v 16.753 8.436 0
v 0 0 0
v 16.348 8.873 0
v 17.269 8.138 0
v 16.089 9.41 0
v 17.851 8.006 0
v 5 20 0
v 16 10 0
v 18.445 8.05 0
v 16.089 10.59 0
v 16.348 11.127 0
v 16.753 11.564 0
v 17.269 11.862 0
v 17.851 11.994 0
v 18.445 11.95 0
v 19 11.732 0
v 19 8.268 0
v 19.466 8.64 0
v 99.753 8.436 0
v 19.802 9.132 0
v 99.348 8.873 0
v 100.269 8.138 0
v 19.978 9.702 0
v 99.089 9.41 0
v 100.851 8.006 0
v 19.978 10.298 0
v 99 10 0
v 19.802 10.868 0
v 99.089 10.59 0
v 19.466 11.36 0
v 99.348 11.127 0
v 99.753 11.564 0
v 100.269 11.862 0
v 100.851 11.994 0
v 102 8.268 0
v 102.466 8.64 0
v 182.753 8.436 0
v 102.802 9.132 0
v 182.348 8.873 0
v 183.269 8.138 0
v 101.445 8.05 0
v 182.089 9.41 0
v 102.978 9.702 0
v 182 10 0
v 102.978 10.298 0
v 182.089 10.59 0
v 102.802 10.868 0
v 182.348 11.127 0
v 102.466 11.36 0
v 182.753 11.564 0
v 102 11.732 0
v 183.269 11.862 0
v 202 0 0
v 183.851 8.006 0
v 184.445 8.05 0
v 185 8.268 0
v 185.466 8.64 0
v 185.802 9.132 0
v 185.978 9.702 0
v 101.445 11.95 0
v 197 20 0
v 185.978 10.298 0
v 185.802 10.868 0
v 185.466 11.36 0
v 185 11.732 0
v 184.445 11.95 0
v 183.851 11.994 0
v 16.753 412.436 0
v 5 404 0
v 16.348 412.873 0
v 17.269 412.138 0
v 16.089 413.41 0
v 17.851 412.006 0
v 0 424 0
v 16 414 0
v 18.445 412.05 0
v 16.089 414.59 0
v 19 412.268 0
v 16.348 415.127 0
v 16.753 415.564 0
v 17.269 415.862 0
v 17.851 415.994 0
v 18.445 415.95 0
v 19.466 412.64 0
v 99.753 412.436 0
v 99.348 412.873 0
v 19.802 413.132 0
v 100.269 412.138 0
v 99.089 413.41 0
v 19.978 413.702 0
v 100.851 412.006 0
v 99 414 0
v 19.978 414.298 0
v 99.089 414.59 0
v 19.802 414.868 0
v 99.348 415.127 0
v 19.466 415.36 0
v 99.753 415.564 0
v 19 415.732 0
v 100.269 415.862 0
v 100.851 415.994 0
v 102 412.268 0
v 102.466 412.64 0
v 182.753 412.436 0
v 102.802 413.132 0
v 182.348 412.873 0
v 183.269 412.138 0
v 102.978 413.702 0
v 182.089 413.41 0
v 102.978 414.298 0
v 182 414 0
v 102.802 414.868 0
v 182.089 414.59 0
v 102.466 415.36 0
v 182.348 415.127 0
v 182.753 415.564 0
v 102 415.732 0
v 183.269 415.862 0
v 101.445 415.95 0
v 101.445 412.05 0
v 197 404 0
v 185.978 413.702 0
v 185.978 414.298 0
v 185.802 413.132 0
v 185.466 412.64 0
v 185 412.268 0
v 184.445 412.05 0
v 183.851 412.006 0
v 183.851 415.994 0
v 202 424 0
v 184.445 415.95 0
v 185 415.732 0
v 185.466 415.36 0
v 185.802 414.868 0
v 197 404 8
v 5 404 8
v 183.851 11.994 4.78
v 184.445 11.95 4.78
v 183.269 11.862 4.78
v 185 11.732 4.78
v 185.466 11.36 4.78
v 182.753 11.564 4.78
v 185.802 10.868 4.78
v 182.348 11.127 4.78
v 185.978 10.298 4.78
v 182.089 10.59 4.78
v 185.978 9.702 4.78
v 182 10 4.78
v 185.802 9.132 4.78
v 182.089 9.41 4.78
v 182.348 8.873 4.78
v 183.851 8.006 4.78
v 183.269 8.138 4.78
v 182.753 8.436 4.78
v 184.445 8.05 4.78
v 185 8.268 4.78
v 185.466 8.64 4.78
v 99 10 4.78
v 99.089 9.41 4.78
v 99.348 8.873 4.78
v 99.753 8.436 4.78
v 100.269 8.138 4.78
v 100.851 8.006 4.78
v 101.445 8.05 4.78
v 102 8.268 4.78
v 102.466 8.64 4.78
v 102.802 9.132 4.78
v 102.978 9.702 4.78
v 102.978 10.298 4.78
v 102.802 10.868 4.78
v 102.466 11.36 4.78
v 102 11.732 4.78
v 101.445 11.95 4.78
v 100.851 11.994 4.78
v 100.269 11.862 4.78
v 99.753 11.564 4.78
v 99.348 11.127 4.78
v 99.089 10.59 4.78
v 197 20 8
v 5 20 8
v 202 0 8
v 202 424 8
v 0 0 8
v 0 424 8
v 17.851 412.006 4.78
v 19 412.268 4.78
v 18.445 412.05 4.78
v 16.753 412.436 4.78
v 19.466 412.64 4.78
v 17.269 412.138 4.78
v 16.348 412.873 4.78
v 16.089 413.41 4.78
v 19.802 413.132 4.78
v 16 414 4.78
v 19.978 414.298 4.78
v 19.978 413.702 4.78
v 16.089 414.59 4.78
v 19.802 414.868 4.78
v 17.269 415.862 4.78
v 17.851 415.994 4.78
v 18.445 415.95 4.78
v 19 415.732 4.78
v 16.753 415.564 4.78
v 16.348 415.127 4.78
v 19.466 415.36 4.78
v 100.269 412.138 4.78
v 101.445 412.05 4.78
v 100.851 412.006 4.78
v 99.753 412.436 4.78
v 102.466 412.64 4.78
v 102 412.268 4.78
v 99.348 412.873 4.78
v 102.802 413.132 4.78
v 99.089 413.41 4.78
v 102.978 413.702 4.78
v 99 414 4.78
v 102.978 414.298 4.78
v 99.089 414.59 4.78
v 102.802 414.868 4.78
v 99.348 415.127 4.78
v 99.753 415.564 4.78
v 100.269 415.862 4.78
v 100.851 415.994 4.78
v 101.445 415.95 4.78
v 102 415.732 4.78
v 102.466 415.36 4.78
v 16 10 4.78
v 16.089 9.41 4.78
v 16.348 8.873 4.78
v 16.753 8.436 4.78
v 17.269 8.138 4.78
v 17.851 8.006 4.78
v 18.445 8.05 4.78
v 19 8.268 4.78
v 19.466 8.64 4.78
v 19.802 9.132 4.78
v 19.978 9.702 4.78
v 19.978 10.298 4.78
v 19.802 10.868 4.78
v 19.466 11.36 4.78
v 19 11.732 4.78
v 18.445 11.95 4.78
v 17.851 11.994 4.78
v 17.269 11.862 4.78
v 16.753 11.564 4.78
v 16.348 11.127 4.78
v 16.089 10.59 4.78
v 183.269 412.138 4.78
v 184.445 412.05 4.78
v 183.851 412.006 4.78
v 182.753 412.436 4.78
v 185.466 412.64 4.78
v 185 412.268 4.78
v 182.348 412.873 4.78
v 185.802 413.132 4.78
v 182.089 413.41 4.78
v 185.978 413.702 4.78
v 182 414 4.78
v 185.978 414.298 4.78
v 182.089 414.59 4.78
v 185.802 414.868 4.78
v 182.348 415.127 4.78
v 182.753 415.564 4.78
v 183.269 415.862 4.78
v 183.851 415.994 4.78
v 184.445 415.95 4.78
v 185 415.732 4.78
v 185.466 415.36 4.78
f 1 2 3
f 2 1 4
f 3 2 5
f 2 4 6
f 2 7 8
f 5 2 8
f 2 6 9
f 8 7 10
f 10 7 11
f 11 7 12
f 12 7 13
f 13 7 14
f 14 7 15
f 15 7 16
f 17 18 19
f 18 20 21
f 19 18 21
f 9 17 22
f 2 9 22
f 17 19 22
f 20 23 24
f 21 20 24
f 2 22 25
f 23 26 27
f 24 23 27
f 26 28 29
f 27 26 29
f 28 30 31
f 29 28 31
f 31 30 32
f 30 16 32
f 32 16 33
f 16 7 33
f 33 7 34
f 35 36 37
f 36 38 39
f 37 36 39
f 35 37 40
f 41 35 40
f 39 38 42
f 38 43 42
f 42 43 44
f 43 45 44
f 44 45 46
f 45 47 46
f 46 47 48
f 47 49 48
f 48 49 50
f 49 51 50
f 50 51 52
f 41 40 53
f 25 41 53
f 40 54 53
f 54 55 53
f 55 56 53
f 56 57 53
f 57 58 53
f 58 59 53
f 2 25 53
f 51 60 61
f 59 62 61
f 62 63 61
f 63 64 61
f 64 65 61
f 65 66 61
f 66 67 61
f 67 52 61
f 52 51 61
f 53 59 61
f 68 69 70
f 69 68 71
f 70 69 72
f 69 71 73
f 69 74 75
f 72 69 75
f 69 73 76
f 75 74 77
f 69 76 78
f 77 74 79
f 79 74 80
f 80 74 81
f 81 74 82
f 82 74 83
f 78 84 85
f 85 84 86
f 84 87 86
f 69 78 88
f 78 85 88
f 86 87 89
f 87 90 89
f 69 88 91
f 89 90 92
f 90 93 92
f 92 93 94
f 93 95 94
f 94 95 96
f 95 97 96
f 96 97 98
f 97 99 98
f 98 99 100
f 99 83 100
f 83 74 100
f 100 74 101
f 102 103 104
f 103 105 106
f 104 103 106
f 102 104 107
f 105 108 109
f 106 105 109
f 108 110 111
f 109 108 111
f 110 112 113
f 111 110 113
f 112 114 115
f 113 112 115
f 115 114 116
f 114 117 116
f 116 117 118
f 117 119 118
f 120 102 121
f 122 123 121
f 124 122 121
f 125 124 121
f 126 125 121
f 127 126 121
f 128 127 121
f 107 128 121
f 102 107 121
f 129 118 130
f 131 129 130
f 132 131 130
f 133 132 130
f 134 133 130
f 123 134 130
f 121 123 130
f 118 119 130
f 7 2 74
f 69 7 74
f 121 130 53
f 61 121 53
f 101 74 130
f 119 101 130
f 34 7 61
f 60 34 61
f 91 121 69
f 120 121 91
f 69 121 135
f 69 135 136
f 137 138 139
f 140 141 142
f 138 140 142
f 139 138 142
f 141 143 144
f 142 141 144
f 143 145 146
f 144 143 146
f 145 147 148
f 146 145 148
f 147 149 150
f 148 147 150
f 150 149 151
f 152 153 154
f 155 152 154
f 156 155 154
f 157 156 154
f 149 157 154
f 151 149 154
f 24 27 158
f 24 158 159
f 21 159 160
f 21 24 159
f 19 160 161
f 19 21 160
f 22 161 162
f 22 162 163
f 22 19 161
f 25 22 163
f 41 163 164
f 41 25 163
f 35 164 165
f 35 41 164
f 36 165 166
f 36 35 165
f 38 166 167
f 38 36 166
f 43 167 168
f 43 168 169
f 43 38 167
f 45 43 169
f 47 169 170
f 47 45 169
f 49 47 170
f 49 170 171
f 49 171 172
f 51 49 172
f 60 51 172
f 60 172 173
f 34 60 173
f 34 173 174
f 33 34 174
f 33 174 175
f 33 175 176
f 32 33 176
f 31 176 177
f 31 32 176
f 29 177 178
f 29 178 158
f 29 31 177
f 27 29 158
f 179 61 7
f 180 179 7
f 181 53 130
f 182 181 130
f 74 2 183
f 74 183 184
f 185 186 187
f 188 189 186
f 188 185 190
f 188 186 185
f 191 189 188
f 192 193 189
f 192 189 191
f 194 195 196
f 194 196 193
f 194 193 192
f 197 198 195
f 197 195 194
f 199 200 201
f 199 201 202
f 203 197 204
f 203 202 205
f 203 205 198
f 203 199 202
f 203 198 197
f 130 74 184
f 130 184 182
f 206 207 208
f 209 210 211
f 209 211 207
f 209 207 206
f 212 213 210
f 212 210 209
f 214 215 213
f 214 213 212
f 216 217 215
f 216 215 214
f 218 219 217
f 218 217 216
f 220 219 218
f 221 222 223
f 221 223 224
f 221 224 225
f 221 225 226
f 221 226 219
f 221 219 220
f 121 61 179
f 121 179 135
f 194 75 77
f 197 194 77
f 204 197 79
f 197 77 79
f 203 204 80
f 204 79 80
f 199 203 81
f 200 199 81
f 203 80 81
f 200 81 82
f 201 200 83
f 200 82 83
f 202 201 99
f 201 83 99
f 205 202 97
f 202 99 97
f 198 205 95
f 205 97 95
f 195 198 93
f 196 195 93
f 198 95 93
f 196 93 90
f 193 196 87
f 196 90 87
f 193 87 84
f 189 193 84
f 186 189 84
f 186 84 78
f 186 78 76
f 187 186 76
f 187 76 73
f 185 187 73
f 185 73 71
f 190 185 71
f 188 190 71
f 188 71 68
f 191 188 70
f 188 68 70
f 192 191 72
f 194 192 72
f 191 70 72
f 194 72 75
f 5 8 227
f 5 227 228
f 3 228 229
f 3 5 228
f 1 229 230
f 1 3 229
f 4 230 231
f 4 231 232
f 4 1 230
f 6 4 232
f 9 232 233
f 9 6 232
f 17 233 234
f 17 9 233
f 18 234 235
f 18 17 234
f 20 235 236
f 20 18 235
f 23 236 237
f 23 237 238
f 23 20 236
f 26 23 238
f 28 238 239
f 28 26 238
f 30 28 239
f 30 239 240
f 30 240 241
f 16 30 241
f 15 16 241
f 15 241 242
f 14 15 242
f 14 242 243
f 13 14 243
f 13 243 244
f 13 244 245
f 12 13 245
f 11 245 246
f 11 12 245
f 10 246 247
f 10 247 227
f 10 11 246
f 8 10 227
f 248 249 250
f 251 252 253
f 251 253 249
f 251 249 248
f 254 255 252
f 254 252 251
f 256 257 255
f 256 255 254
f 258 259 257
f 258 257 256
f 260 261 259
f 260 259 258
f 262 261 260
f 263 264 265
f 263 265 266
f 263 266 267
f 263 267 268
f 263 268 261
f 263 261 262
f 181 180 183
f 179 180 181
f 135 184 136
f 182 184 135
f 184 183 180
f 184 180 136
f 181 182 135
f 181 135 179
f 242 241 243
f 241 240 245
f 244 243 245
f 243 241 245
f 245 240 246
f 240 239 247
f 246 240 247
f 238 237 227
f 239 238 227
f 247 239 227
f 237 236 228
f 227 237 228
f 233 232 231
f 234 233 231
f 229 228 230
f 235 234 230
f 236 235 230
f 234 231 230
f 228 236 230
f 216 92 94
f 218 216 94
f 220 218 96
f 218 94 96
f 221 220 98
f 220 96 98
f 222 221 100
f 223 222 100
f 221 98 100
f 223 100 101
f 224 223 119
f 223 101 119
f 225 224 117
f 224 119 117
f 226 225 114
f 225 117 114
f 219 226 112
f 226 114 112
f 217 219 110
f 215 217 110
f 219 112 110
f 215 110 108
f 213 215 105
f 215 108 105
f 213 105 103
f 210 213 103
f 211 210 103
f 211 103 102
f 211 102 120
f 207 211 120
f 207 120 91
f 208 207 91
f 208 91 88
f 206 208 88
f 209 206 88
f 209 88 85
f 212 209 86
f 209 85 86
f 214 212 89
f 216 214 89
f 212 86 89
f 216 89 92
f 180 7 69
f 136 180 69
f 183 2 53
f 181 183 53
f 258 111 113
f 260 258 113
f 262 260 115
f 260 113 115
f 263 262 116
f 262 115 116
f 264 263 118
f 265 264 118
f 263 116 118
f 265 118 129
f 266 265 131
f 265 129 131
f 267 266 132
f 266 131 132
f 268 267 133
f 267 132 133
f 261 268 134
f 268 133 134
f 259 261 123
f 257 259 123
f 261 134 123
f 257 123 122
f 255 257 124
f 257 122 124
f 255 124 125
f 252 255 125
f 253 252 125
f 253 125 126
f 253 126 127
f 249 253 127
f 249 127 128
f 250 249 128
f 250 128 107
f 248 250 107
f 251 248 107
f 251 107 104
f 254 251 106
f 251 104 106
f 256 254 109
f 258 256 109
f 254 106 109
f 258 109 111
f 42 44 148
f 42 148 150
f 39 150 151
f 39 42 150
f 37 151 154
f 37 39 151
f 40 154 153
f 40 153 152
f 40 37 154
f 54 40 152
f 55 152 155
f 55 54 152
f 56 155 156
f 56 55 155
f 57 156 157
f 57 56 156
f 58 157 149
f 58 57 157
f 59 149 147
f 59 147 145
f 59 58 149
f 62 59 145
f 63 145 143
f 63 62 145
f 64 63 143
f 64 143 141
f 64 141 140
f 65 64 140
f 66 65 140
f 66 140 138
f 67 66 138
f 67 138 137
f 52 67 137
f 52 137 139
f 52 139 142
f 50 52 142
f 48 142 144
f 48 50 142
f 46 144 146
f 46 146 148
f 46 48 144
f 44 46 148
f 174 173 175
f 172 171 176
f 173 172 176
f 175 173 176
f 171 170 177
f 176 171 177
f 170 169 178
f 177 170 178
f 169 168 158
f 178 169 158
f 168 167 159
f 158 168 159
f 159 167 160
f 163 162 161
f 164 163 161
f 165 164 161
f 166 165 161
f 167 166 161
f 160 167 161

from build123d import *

# Parameters (mm, degrees)
SKETCH1_W           = 202
SKETCH1_H           = 424
BOSS_EXTRUDE1_DEPTH = 8
SKETCH2_W           = 192
SKETCH2_H           = 384
CUT_EXTRUDE1_DEPTH  = 470.727580625
SKETCH4_R           = 2
CUT_EXTRUDE2_DEPTH  = 4.78


with BuildPart() as part:
    # Sketch1 → Boss-Extrude1 (new body)
    with BuildSketch(Plane.XY):
        with Locations((101, 212)):
            Rectangle(SKETCH1_W, SKETCH1_H)
    extrude(amount=BOSS_EXTRUDE1_DEPTH)

    # Sketch2 → Cut-Extrude1 (cut, through all)
    with BuildSketch(Plane(origin=(0, 0, 0), x_dir=(-1, 0, 0), z_dir=(0, 0, -1))):
        with Locations((-101, 212)):
            Rectangle(SKETCH2_W, SKETCH2_H)
    extrude(amount=-CUT_EXTRUDE1_DEPTH, mode=Mode.SUBTRACT)

    # Sketch4 → Cut-Extrude2 (cut)
    with BuildSketch(Plane(origin=(0, 0, 0), x_dir=(-1, 0, 0), z_dir=(0, 0, -1))):
        with Locations((-184, 414)):
            Circle(SKETCH4_R)
        with Locations((-18, 414)):
            Circle(SKETCH4_R)
        with Locations((-101, 414)):
            Circle(SKETCH4_R)
    cut_extrude2 = extrude(amount=-CUT_EXTRUDE2_DEPTH, mode=Mode.SUBTRACT)

    # Mirror1: Cut-Extrude2 across plane
    add(cut_extrude2.mirror(Plane.ZX.offset(212)), mode=Mode.SUBTRACT)


solid = part.part
